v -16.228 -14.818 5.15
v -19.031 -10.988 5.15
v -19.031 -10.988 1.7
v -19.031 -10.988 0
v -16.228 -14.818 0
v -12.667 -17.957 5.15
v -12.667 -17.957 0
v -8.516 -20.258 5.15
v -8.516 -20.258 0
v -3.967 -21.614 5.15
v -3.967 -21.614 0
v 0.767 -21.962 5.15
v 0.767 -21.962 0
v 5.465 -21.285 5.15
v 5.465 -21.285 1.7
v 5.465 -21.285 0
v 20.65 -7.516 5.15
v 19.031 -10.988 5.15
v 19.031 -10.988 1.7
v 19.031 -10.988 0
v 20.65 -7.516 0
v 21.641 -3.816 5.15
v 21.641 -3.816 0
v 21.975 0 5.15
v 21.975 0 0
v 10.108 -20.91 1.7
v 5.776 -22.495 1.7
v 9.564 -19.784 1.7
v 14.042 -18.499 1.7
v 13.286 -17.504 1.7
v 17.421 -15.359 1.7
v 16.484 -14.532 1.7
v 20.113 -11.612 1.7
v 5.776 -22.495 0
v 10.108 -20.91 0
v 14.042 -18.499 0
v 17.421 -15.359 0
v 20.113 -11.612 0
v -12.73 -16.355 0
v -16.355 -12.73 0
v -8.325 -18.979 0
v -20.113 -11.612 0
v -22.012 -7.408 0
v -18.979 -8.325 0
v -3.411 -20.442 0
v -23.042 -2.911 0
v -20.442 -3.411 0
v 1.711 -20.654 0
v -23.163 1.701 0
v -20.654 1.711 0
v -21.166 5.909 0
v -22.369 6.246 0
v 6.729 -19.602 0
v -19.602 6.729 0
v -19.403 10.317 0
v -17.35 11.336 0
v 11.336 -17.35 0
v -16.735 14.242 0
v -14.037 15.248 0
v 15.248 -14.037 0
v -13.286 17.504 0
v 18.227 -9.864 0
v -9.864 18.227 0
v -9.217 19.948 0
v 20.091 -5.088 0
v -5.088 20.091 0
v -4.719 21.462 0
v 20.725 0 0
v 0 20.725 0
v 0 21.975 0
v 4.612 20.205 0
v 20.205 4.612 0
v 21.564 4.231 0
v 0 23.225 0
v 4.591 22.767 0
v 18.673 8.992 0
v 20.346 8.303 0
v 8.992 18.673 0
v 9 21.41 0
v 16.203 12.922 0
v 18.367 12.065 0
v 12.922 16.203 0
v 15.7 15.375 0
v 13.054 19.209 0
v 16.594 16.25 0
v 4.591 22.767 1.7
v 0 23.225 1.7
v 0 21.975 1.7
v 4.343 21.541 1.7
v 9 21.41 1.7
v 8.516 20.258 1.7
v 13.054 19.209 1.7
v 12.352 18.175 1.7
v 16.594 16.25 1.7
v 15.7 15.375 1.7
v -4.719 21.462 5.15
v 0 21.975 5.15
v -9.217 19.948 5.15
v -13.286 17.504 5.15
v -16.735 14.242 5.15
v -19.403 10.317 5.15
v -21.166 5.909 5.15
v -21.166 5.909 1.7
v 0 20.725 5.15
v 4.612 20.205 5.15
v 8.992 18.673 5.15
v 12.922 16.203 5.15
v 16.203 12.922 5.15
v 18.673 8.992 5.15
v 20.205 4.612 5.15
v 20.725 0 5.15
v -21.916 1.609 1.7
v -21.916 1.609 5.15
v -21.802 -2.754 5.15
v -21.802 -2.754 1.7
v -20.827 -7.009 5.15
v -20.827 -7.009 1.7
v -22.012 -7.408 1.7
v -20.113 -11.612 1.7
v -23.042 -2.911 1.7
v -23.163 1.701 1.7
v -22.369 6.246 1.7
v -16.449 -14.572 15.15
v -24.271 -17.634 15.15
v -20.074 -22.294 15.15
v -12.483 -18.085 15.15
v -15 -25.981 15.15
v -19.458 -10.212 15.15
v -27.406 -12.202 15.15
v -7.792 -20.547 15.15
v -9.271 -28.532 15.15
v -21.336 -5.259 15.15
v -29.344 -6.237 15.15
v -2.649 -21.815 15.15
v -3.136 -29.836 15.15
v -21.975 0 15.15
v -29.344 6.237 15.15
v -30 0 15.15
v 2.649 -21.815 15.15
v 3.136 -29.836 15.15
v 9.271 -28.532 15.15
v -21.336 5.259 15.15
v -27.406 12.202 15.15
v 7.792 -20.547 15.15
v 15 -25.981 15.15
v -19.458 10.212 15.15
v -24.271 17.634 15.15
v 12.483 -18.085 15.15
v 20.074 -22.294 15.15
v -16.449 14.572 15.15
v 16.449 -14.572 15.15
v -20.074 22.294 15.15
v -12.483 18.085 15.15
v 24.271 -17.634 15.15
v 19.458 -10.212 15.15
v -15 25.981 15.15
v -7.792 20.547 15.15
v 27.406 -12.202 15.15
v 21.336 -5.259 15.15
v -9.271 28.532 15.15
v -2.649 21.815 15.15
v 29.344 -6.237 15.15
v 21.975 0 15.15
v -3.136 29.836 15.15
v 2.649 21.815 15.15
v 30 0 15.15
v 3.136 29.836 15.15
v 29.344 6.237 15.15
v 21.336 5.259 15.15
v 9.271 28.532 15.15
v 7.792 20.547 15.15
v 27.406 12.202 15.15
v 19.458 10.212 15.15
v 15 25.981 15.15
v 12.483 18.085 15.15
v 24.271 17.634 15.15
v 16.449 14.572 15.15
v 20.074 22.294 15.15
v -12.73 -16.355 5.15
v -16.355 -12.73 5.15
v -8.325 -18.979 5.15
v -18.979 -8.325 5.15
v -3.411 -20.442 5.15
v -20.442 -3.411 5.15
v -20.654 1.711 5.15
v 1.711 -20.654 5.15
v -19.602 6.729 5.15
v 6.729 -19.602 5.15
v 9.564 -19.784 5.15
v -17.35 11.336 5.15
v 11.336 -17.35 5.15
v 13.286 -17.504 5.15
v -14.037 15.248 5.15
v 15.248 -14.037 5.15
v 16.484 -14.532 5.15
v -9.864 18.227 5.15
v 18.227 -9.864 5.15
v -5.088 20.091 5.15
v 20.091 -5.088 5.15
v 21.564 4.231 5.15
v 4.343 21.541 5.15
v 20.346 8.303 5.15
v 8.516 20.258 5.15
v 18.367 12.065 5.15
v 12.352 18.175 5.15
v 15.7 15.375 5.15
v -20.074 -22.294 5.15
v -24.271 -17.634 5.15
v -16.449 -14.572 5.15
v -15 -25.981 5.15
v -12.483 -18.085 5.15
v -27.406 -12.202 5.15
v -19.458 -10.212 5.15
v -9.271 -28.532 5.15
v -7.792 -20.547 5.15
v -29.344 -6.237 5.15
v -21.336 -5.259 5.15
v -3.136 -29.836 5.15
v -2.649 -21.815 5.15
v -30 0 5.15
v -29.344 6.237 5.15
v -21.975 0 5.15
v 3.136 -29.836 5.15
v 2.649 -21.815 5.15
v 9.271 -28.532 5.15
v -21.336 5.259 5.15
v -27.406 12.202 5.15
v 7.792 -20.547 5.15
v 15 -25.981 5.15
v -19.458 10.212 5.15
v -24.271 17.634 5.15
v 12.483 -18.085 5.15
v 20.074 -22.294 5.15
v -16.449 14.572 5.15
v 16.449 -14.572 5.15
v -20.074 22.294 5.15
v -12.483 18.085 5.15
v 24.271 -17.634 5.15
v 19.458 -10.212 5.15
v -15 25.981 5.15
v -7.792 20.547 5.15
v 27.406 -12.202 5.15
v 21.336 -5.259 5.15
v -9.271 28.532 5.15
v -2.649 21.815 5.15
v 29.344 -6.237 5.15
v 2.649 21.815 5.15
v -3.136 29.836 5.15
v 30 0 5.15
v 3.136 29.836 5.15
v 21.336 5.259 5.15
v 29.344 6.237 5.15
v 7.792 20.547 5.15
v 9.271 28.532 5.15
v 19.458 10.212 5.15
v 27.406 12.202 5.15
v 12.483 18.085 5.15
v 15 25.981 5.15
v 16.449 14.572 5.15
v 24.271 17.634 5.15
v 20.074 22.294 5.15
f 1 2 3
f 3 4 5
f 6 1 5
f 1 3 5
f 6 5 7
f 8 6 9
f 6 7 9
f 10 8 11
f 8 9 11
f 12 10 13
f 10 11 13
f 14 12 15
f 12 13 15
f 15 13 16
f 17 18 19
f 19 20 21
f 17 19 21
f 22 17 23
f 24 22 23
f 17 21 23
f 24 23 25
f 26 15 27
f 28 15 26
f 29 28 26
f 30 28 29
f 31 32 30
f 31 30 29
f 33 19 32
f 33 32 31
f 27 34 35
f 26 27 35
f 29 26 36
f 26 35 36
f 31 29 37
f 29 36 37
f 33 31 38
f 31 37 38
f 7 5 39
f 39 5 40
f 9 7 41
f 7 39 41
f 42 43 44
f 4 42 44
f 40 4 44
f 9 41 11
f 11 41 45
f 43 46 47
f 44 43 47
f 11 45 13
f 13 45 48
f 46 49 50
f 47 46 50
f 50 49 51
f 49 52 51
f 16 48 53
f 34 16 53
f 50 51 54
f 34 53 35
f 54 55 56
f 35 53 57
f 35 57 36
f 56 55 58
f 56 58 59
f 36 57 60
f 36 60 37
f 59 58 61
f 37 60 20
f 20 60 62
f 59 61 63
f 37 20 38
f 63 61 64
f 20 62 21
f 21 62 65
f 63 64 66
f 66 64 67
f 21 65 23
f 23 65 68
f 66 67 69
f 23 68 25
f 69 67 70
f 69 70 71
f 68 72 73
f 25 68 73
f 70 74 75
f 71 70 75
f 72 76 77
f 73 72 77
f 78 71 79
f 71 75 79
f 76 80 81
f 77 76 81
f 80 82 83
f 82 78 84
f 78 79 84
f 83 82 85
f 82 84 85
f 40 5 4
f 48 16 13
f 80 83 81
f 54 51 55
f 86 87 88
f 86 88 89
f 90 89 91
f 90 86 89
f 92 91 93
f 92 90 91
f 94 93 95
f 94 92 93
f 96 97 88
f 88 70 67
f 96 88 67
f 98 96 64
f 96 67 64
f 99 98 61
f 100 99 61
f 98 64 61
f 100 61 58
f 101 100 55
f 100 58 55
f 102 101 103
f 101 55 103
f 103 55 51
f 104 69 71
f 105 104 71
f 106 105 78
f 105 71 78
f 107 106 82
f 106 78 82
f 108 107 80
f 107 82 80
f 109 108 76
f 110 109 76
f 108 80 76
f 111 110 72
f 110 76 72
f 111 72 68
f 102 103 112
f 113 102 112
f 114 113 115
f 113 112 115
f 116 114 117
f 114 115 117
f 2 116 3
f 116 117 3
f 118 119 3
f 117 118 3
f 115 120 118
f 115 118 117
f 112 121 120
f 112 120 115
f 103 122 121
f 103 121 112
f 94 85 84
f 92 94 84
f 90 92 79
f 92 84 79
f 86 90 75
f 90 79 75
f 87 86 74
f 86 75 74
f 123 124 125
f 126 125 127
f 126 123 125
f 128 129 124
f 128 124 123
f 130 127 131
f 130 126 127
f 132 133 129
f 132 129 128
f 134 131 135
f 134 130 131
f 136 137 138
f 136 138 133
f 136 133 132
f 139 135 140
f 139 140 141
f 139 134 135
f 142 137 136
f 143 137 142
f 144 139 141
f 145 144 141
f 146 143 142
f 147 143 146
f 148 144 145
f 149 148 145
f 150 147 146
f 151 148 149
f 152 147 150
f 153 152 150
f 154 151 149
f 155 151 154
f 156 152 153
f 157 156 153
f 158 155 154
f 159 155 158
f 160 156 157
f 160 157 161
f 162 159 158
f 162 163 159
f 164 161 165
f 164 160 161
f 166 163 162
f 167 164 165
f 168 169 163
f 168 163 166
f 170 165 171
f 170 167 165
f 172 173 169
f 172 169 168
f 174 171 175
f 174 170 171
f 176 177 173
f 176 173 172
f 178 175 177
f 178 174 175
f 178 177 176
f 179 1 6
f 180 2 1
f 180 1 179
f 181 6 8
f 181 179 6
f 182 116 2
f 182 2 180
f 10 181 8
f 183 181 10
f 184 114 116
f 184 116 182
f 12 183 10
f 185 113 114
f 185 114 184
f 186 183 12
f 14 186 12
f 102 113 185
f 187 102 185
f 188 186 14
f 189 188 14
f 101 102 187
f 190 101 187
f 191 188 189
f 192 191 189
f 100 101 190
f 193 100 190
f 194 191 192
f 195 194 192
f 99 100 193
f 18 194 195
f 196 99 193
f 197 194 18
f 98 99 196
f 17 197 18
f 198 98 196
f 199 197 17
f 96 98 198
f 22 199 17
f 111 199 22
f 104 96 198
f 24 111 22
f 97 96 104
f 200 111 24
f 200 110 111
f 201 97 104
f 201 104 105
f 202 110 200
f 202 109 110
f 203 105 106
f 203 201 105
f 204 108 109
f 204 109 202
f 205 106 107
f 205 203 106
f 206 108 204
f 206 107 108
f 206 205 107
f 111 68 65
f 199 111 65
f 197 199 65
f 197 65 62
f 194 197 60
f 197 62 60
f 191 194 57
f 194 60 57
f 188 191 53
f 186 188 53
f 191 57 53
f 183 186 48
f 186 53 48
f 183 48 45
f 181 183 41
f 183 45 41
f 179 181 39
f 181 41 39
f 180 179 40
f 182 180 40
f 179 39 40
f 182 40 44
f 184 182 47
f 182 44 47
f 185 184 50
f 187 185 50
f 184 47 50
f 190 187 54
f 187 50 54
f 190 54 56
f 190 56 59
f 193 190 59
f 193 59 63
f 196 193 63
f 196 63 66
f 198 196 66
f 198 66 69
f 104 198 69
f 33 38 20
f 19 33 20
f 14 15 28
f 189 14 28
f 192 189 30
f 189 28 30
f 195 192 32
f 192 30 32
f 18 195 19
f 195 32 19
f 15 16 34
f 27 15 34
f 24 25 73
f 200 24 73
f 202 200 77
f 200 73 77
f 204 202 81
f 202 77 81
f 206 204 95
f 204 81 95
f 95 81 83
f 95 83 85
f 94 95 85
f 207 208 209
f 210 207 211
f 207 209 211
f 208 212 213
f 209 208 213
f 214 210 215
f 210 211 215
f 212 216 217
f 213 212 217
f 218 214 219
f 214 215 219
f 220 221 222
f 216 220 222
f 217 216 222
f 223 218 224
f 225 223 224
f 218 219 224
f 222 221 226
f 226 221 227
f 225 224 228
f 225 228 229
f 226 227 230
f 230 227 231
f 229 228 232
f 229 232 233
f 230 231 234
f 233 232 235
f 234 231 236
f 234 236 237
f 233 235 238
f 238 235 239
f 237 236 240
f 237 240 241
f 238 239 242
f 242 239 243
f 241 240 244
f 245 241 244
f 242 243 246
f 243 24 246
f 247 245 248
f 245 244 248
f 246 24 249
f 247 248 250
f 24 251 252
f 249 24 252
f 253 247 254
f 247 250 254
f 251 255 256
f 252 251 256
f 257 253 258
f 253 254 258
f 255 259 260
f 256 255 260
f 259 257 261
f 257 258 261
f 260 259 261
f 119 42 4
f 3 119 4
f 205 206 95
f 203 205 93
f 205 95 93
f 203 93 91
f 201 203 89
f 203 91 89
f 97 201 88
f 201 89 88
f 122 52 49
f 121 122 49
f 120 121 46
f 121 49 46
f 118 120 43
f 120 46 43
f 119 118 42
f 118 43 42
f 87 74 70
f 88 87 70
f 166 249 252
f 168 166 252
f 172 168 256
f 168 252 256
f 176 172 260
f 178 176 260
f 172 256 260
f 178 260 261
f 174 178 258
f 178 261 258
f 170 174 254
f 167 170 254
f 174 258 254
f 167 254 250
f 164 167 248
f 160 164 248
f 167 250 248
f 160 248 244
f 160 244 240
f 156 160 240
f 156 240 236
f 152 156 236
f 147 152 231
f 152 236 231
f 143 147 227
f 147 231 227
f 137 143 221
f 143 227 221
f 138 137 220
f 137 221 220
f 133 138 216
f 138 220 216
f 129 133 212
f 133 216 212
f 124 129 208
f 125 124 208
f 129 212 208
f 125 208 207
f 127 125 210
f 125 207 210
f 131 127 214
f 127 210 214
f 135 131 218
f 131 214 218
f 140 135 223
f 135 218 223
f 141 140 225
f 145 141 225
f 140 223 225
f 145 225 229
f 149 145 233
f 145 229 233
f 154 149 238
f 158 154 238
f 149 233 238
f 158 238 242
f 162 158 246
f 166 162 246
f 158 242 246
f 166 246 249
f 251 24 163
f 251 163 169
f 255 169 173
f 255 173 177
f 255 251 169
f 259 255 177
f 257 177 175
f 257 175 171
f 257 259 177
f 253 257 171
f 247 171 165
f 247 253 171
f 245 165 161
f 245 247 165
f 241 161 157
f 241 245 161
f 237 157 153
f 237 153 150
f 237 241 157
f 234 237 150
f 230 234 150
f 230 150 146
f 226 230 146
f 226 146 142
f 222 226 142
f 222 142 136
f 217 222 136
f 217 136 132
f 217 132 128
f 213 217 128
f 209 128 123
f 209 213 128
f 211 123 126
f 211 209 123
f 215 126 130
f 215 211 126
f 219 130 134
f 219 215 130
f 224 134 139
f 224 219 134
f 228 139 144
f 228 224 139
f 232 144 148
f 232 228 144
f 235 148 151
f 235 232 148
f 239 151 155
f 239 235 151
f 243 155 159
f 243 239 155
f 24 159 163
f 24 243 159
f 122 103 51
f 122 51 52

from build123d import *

# Parameters (mm, degrees)
F4_DEPTH = 5.15
F5_DEPTH = 1.7
F6_R     = 30
F6_R_2   = 21.975
F7_DEPTH = 10


with BuildPart() as f4:
    # F3 (on Top) → F4 (new body)
    with BuildSketch(Plane.XY):
        with BuildLine():
            ThreePointArc((15.7004660478, 15.3751744992), (8.5156081808, 20.2579624422), (0, 21.975))
            ThreePointArc((0, 21.975), (-13.2861060135, 17.5037142344), (-21.1655247279, 5.909415199))
            ThreePointArc((-21.1655247279, 5.909415199), (-21.8017141943, -2.7542482078), (-19.0309082482, -10.9875))
            ThreePointArc((-19.0309082482, -10.9875), (-8.5156081808, -20.2579624422), (5.4650586801, -21.2845896983))
            ThreePointArc((5.4650586801, -21.2845896983), (13.2861060135, -17.5037142344), (19.0309082482, -10.9875))
            ThreePointArc((19.0309082482, -10.9875), (21.2262200327, -5.6875485161), (21.975, 0))
            ThreePointArc((21.975, 0), (20.3459869065, 8.3030983253), (15.7004660478, 15.3751744992))
        make_face()
        with BuildLine():
            ThreePointArc((0, 20.725), (14.6547880401, 14.6547880401), (20.725, 0))
            ThreePointArc((20.725, 0), (-14.6547880401, -14.6547880401), (0, 20.725))
        make_face(mode=Mode.SUBTRACT)
    extrude(amount=F4_DEPTH)

    # F3 (on Top) → F5 (join)
    with BuildSketch(Plane.XY):
        with BuildLine():
            ThreePointArc((-19.0309082482, -10.9875), (-21.8017141943, -2.7542482078), (-21.1655247279, 5.909415199))
            Line((-21.1655247279, 5.909415199), (-22.3694794905, 6.2455594083))
            ThreePointArc((-22.3694794905, 6.2455594083), (-23.0418572088, -2.9109176167), (-20.1134400029, -11.6125))
            Line((-20.1134400029, -11.6125), (-19.0309082482, -10.9875))
        make_face()
        with BuildLine():
            Line((0, 23.225), (0, 21.975))
            ThreePointArc((0, 21.975), (8.5156081808, 20.2579624422), (15.7004660478, 15.3751744992))
            Line((15.7004660478, 15.3751744992), (16.5935528537, 16.2497578041))
            ThreePointArc((16.5935528537, 16.2497578041), (9, 21.4102925015), (0, 23.225))
        make_face()
        with BuildLine():
            Line((20.1134400029, -11.6125), (19.0309082482, -10.9875))
            ThreePointArc((19.0309082482, -10.9875), (13.2861060135, -17.5037142344), (5.4650586801, -21.2845896983))
            Line((5.4650586801, -21.2845896983), (5.7759266368, -22.4953172124))
            ThreePointArc((5.7759266368, -22.4953172124), (14.0418572088, -18.4993748848), (20.1134400029, -11.6125))
        make_face()
    extrude(amount=F5_DEPTH)


with BuildPart() as f7:
    # F6 (on face) → F7 (new body)
    with BuildSketch(Plane.XY.offset(5.15)):
        Circle(F6_R)
        Circle(F6_R_2, mode=Mode.SUBTRACT)
    extrude(amount=F7_DEPTH)


solid = Compound([f4.part, f7.part])
